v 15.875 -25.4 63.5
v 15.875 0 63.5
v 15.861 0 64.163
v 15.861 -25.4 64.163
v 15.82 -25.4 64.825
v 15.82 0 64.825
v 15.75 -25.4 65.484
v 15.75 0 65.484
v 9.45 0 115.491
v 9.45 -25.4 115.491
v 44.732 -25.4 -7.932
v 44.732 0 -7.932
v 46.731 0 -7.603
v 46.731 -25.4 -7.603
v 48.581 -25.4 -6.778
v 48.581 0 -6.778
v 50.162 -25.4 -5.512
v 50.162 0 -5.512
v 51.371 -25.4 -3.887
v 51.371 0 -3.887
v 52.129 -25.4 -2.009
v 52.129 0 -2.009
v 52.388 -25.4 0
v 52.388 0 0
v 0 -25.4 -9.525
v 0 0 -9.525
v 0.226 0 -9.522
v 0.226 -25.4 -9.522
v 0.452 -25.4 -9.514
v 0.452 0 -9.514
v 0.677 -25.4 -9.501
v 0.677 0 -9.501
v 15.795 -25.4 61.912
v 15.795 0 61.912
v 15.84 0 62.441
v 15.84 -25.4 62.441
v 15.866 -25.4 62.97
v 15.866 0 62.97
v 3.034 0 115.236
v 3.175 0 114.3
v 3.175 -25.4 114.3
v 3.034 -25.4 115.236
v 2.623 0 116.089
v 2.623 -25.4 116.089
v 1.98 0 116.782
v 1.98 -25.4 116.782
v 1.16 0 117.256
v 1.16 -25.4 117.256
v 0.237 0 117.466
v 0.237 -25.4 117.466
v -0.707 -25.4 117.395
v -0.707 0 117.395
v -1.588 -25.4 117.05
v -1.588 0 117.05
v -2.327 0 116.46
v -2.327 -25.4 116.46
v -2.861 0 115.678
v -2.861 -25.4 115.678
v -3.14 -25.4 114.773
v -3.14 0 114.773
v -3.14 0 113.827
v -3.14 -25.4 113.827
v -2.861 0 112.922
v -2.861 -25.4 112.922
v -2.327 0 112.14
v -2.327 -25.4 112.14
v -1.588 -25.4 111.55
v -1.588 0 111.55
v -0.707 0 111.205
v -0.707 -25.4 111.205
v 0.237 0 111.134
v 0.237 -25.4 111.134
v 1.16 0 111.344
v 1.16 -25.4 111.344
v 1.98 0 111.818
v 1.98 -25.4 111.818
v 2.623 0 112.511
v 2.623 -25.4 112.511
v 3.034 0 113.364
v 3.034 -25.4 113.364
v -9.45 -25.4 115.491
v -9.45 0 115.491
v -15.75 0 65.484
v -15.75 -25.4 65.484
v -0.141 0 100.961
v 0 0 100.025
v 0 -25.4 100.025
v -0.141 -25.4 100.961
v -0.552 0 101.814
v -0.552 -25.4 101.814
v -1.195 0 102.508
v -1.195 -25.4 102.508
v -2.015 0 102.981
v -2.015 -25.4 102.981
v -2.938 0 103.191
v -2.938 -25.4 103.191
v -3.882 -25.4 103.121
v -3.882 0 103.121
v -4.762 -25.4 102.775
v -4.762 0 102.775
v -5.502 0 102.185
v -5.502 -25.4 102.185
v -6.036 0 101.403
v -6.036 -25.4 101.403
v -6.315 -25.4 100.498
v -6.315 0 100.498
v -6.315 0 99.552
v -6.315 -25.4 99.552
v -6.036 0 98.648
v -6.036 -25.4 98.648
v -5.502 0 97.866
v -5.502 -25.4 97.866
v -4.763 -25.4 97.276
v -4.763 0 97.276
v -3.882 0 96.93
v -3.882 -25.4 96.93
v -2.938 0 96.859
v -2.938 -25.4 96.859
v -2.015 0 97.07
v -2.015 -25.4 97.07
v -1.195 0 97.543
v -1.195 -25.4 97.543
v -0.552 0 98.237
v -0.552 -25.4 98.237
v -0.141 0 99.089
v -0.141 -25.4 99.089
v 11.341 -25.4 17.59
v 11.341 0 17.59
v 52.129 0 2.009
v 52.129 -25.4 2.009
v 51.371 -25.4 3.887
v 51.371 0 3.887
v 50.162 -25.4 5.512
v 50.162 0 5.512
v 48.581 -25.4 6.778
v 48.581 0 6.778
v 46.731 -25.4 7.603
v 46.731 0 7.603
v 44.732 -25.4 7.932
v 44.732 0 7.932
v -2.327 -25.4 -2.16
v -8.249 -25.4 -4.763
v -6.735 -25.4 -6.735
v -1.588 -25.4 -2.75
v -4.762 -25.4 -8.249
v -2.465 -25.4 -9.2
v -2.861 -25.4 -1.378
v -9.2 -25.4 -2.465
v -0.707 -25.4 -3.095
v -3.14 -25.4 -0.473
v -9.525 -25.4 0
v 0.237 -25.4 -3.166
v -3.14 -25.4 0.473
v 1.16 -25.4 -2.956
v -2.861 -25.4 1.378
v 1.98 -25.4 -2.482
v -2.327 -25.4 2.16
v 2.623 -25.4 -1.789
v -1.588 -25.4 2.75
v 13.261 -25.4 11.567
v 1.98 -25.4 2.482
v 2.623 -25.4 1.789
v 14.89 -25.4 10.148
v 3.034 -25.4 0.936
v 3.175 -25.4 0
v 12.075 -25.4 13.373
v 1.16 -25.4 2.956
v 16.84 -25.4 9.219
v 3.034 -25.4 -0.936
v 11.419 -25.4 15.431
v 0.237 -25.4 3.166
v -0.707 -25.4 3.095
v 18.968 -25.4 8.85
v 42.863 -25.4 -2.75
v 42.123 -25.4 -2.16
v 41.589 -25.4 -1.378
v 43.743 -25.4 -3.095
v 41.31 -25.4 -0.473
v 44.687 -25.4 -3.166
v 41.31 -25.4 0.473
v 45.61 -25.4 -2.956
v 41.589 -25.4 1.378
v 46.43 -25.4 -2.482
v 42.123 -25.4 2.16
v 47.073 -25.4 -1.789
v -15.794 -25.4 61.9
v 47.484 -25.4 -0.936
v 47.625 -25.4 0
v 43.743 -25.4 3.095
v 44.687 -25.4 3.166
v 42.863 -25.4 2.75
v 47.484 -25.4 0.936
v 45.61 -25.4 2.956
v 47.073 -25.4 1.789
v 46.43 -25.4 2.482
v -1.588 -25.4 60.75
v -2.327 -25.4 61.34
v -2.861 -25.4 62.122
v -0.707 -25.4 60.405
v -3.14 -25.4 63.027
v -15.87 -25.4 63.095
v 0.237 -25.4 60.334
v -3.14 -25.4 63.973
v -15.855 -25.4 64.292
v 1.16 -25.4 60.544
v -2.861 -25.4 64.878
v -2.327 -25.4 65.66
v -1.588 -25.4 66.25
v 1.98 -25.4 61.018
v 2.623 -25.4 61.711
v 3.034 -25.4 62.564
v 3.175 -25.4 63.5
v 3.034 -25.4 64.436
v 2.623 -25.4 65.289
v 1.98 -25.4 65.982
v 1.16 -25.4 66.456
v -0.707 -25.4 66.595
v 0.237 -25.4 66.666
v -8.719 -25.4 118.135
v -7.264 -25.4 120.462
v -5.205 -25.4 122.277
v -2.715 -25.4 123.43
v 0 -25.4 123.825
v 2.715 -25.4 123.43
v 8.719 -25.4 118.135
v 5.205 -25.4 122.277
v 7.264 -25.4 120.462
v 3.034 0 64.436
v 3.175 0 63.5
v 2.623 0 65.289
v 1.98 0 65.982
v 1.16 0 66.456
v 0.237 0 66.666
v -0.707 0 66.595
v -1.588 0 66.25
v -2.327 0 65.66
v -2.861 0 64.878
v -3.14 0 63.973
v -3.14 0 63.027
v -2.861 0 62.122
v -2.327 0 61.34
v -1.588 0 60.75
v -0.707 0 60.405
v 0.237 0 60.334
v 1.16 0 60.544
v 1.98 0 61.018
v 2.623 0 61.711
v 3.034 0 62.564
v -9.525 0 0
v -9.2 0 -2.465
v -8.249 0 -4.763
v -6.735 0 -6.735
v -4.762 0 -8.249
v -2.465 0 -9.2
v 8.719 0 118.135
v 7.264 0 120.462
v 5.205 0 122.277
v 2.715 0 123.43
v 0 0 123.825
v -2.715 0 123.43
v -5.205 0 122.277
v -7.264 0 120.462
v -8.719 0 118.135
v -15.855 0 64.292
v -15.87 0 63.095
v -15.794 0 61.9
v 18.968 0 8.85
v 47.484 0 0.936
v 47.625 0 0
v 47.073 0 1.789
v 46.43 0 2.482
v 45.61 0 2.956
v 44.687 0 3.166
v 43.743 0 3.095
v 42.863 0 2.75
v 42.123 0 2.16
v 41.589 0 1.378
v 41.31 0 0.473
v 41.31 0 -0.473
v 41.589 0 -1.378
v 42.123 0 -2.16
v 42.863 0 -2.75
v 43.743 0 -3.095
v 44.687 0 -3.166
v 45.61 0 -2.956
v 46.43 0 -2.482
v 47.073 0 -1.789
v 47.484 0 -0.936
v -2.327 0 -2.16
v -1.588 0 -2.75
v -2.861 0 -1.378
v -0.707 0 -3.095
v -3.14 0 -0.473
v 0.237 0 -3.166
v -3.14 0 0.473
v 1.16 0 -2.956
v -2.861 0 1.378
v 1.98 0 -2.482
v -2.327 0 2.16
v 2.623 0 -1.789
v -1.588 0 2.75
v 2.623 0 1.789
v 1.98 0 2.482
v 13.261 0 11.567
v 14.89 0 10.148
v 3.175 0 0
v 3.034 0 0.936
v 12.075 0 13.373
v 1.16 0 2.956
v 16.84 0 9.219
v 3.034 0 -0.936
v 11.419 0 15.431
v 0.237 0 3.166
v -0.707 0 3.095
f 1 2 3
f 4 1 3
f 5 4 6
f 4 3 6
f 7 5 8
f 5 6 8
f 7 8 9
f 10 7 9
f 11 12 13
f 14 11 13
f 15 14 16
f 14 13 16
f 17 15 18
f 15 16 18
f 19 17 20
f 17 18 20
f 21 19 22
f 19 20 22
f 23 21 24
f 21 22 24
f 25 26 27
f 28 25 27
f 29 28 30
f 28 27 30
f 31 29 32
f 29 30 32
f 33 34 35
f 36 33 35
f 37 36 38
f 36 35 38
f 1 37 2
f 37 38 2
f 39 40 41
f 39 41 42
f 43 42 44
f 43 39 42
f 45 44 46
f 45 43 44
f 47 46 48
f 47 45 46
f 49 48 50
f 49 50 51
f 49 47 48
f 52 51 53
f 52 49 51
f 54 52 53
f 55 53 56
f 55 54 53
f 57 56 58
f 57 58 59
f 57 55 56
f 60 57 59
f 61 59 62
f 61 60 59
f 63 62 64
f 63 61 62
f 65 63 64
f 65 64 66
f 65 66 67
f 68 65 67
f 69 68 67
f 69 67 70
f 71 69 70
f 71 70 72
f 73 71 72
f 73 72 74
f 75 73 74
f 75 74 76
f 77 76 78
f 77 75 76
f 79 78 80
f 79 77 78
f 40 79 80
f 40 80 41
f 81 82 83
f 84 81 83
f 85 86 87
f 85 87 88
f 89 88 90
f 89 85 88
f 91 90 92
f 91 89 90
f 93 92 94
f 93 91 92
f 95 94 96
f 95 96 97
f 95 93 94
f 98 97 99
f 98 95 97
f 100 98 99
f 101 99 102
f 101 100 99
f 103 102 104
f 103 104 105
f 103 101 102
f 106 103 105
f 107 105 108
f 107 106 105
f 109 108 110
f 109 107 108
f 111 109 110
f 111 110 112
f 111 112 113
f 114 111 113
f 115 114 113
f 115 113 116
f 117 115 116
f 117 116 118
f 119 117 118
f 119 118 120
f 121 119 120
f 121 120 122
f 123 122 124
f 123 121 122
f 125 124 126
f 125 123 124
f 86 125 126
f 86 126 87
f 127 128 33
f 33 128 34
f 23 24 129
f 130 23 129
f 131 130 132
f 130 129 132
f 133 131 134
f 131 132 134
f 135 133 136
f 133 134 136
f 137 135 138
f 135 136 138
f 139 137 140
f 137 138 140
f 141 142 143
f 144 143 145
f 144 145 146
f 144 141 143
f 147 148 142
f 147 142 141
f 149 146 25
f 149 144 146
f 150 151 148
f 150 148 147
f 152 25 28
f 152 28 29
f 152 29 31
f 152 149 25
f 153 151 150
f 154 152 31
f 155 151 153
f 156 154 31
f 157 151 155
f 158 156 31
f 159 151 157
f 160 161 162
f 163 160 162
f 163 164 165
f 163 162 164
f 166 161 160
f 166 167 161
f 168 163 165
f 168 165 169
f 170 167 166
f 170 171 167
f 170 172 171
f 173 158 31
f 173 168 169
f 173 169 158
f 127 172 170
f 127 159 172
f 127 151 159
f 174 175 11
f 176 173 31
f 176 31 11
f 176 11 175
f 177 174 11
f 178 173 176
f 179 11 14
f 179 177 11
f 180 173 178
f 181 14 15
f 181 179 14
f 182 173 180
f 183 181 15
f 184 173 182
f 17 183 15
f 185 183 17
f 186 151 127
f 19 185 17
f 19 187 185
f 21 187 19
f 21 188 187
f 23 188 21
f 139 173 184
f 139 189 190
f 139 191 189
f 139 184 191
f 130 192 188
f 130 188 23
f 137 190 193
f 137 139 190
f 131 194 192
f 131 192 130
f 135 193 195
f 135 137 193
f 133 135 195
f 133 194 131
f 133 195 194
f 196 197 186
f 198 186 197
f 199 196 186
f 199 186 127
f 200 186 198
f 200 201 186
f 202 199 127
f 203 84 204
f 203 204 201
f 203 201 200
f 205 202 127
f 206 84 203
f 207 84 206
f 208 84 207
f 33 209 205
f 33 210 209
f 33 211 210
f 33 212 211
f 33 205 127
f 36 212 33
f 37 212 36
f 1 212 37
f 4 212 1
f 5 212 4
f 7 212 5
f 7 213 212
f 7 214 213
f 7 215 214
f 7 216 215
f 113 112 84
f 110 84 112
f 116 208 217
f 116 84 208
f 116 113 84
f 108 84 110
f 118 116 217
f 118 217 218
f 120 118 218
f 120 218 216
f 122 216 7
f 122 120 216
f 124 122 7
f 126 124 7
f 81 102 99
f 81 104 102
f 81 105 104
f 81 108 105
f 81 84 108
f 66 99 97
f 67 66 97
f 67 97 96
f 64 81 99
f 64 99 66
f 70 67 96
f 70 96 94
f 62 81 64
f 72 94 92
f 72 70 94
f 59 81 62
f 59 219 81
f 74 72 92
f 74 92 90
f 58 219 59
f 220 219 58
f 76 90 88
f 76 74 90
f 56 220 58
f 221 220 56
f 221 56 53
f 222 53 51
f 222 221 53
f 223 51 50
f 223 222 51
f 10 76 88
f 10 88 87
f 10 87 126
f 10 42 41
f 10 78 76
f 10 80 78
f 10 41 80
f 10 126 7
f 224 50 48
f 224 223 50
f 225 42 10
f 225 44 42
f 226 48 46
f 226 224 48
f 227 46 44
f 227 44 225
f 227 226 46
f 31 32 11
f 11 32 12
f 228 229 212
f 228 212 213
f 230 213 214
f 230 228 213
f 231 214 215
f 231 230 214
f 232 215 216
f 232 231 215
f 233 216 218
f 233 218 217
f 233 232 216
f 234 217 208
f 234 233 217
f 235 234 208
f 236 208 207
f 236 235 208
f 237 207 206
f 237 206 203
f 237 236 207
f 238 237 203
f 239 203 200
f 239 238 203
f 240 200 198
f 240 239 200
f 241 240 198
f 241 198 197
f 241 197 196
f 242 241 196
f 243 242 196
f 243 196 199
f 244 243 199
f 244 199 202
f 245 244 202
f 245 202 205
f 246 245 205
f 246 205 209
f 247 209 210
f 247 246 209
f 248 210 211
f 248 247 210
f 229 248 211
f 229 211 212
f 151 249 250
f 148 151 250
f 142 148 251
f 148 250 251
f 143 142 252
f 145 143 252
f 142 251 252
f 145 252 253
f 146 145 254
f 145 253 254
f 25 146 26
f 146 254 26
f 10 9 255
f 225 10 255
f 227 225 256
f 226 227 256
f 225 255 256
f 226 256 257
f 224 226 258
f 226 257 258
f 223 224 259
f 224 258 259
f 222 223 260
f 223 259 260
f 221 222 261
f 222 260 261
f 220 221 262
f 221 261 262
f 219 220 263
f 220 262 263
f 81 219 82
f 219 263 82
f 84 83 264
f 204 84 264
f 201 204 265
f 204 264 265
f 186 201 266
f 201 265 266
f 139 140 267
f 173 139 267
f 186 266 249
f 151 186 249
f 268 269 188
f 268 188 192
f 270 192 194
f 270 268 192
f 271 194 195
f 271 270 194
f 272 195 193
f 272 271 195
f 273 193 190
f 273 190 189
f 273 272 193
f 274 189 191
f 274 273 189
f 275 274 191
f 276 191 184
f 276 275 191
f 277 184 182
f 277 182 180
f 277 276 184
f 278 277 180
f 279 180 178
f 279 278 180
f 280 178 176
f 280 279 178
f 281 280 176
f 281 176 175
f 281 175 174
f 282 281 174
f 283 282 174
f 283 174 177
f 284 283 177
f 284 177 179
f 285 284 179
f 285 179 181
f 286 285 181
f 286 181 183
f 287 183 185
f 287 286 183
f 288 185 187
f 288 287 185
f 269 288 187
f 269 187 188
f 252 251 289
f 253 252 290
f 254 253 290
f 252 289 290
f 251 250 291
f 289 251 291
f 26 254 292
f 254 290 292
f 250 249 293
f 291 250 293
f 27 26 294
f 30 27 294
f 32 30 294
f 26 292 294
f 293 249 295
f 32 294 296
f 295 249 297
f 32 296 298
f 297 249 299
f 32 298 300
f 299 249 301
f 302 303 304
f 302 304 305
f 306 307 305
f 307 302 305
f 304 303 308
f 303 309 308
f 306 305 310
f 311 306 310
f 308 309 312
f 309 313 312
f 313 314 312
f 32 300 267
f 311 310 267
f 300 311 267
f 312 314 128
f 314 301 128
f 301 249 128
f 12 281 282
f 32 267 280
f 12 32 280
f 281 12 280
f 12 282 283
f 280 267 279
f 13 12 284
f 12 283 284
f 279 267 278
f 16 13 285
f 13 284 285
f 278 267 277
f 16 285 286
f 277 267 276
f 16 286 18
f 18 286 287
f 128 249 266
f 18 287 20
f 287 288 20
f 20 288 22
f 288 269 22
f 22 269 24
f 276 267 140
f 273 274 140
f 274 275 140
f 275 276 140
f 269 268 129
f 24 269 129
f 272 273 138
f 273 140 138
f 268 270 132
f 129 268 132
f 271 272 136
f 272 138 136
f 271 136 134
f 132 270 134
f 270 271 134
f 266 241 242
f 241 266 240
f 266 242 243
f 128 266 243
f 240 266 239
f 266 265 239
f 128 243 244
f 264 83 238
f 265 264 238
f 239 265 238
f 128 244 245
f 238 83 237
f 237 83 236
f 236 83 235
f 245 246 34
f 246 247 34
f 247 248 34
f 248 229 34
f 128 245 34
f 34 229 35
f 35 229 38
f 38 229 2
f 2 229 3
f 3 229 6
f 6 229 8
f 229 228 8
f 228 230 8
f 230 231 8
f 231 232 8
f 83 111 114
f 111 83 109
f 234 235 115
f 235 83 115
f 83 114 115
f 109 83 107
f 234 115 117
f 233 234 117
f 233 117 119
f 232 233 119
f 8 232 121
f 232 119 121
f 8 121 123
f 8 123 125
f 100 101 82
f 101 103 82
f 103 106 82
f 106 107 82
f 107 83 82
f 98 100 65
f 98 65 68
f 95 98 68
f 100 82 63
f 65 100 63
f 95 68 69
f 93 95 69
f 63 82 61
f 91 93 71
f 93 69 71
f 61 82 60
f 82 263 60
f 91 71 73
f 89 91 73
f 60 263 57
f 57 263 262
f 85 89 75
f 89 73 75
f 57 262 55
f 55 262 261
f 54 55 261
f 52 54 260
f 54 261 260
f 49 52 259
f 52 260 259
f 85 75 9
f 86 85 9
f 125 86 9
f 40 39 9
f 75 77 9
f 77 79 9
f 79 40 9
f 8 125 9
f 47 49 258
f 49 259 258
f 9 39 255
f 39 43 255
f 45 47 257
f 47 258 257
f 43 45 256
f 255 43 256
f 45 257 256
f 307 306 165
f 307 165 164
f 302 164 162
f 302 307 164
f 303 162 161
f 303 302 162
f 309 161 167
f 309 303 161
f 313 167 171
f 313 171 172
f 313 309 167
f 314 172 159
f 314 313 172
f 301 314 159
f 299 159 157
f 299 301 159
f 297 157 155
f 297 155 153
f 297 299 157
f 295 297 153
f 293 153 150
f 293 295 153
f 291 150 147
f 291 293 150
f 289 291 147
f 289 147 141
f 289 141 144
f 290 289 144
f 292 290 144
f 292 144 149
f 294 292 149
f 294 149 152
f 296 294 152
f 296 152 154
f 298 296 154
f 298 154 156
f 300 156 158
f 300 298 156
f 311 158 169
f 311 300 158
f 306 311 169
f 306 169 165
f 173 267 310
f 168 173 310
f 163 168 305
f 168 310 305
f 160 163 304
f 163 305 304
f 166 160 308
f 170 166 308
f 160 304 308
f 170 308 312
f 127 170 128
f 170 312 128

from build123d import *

# Parameters (mm, degrees)
F2_R     = 3.175
F3_DEPTH = 25.4


# Not quite as in the source:
# - a feature names something its author has since deleted; it is built from what else it names


with BuildPart() as f3:
    # F2 (on Front) → F3 (new body)
    with BuildSketch(Plane.XZ):
        with BuildLine():
            ThreePointArc((15.7504884308, 65.4843737526), (6.286e-07, 79.375), (-15.7504882737, 65.484375))
            ThreePointArc((-15.7504882737, 65.484375), (-15.8738192656, 63.6936154008), (-15.7942028036, 61.9003804205))
            ThreePointArc((-15.7942028036, 61.9003804205), (0.0060905531, 47.6250011683), (15.7954255641, 61.9125))
            ThreePointArc((15.7954255641, 61.9125), (15.8550939106, 62.7052534459), (15.875, 63.5))
            ThreePointArc((15.875, 63.5), (15.8438415297, 64.4941381092), (15.7504884308, 65.4843737526))
        make_face()
        with Locations((0, 63.5)):
            Circle(F2_R, mode=Mode.SUBTRACT)
        with BuildLine():
            Line((-9.4502929642, 115.490625), (-15.7504882737, 65.484375))
            ThreePointArc((-15.7504882737, 65.484375), (6.286e-07, 79.375), (15.7504884308, 65.4843737526))
            Line((15.7504884308, 65.4843737526), (9.4502929642, 115.490625))
            ThreePointArc((9.4502929642, 115.490625), (9.5063048942, 114.896483242), (9.525, 114.3))
            ThreePointArc((9.525, 114.3), (-0.596483242, 104.7936951058), (-9.4502929642, 115.490625))
        make_face()
        with Locations((-3.175, 100.0252)):
            Circle(F2_R, mode=Mode.SUBTRACT)
        with BuildLine():
            ThreePointArc((15.7954255641, 61.9125), (0.0060905531, 47.6250011683), (-15.7942028036, 61.9003804205))
            Line((-15.7942028036, 61.9003804205), (-9.525, 0))
            ThreePointArc((-9.525, 0), (0, 9.525), (9.525, 0))
            ThreePointArc((9.525, 0), (6.9705567315, -6.4912990883), (0.6773435479, -9.500885786))
            Line((0.6773435479, -9.500885786), (44.7324052746, -7.9324746146))
            ThreePointArc((44.7324052746, -7.9324746146), (36.5125, 0), (44.7324052746, 7.9324746146))
            Line((44.7324052746, 7.9324746146), (18.968327868, 8.8497055806))
            ThreePointArc((18.968327868, 8.8497055806), (13.2612039825, 11.5674628959), (11.3408358685, 17.5898921545))
            Line((11.3408358685, 17.5898921545), (15.7954255641, 61.9125))
        make_face()
        with BuildLine():
            ThreePointArc((9.4502929642, 115.490625), (0, 123.825), (-9.4502929642, 115.490625))
            ThreePointArc((-9.4502929642, 115.490625), (-0.596483242, 104.7936951058), (9.525, 114.3))
            ThreePointArc((9.525, 114.3), (9.5063048942, 114.896483242), (9.4502929642, 115.490625))
        make_face()
        with Locations((0, 114.3)):
            Circle(F2_R, mode=Mode.SUBTRACT)
        with BuildLine():
            ThreePointArc((9.525, 0), (0, 9.525), (-9.525, 0))
            ThreePointArc((-9.525, 0), (-6.7351920908, -6.7351920908), (0, -9.525))
            Line((0, -9.525), (0.6773435479, -9.500885786))
            ThreePointArc((0.6773435479, -9.500885786), (6.9705567315, -6.4912990883), (9.525, 0))
        make_face()
        Circle(F2_R, mode=Mode.SUBTRACT)
        with BuildLine():
            Line((0.6773435479, -9.500885786), (0, -9.525))
            ThreePointArc((0, -9.525), (0.3388863295, -9.5189695375), (0.6773435479, -9.500885786))
        make_face()
        with BuildLine():
            ThreePointArc((52.3875, 0), (50.1616327839, 5.5119104847), (44.7324052746, 7.9324746146))
            ThreePointArc((44.7324052746, 7.9324746146), (36.5125, 0), (44.7324052746, -7.9324746146))
            ThreePointArc((44.7324052746, -7.9324746146), (50.1616327839, -5.5119104847), (52.3875, 0))
        make_face()
        with Locations((44.45, 0)):
            Circle(F2_R, mode=Mode.SUBTRACT)
    extrude(amount=F3_DEPTH)


solid = f3.part
